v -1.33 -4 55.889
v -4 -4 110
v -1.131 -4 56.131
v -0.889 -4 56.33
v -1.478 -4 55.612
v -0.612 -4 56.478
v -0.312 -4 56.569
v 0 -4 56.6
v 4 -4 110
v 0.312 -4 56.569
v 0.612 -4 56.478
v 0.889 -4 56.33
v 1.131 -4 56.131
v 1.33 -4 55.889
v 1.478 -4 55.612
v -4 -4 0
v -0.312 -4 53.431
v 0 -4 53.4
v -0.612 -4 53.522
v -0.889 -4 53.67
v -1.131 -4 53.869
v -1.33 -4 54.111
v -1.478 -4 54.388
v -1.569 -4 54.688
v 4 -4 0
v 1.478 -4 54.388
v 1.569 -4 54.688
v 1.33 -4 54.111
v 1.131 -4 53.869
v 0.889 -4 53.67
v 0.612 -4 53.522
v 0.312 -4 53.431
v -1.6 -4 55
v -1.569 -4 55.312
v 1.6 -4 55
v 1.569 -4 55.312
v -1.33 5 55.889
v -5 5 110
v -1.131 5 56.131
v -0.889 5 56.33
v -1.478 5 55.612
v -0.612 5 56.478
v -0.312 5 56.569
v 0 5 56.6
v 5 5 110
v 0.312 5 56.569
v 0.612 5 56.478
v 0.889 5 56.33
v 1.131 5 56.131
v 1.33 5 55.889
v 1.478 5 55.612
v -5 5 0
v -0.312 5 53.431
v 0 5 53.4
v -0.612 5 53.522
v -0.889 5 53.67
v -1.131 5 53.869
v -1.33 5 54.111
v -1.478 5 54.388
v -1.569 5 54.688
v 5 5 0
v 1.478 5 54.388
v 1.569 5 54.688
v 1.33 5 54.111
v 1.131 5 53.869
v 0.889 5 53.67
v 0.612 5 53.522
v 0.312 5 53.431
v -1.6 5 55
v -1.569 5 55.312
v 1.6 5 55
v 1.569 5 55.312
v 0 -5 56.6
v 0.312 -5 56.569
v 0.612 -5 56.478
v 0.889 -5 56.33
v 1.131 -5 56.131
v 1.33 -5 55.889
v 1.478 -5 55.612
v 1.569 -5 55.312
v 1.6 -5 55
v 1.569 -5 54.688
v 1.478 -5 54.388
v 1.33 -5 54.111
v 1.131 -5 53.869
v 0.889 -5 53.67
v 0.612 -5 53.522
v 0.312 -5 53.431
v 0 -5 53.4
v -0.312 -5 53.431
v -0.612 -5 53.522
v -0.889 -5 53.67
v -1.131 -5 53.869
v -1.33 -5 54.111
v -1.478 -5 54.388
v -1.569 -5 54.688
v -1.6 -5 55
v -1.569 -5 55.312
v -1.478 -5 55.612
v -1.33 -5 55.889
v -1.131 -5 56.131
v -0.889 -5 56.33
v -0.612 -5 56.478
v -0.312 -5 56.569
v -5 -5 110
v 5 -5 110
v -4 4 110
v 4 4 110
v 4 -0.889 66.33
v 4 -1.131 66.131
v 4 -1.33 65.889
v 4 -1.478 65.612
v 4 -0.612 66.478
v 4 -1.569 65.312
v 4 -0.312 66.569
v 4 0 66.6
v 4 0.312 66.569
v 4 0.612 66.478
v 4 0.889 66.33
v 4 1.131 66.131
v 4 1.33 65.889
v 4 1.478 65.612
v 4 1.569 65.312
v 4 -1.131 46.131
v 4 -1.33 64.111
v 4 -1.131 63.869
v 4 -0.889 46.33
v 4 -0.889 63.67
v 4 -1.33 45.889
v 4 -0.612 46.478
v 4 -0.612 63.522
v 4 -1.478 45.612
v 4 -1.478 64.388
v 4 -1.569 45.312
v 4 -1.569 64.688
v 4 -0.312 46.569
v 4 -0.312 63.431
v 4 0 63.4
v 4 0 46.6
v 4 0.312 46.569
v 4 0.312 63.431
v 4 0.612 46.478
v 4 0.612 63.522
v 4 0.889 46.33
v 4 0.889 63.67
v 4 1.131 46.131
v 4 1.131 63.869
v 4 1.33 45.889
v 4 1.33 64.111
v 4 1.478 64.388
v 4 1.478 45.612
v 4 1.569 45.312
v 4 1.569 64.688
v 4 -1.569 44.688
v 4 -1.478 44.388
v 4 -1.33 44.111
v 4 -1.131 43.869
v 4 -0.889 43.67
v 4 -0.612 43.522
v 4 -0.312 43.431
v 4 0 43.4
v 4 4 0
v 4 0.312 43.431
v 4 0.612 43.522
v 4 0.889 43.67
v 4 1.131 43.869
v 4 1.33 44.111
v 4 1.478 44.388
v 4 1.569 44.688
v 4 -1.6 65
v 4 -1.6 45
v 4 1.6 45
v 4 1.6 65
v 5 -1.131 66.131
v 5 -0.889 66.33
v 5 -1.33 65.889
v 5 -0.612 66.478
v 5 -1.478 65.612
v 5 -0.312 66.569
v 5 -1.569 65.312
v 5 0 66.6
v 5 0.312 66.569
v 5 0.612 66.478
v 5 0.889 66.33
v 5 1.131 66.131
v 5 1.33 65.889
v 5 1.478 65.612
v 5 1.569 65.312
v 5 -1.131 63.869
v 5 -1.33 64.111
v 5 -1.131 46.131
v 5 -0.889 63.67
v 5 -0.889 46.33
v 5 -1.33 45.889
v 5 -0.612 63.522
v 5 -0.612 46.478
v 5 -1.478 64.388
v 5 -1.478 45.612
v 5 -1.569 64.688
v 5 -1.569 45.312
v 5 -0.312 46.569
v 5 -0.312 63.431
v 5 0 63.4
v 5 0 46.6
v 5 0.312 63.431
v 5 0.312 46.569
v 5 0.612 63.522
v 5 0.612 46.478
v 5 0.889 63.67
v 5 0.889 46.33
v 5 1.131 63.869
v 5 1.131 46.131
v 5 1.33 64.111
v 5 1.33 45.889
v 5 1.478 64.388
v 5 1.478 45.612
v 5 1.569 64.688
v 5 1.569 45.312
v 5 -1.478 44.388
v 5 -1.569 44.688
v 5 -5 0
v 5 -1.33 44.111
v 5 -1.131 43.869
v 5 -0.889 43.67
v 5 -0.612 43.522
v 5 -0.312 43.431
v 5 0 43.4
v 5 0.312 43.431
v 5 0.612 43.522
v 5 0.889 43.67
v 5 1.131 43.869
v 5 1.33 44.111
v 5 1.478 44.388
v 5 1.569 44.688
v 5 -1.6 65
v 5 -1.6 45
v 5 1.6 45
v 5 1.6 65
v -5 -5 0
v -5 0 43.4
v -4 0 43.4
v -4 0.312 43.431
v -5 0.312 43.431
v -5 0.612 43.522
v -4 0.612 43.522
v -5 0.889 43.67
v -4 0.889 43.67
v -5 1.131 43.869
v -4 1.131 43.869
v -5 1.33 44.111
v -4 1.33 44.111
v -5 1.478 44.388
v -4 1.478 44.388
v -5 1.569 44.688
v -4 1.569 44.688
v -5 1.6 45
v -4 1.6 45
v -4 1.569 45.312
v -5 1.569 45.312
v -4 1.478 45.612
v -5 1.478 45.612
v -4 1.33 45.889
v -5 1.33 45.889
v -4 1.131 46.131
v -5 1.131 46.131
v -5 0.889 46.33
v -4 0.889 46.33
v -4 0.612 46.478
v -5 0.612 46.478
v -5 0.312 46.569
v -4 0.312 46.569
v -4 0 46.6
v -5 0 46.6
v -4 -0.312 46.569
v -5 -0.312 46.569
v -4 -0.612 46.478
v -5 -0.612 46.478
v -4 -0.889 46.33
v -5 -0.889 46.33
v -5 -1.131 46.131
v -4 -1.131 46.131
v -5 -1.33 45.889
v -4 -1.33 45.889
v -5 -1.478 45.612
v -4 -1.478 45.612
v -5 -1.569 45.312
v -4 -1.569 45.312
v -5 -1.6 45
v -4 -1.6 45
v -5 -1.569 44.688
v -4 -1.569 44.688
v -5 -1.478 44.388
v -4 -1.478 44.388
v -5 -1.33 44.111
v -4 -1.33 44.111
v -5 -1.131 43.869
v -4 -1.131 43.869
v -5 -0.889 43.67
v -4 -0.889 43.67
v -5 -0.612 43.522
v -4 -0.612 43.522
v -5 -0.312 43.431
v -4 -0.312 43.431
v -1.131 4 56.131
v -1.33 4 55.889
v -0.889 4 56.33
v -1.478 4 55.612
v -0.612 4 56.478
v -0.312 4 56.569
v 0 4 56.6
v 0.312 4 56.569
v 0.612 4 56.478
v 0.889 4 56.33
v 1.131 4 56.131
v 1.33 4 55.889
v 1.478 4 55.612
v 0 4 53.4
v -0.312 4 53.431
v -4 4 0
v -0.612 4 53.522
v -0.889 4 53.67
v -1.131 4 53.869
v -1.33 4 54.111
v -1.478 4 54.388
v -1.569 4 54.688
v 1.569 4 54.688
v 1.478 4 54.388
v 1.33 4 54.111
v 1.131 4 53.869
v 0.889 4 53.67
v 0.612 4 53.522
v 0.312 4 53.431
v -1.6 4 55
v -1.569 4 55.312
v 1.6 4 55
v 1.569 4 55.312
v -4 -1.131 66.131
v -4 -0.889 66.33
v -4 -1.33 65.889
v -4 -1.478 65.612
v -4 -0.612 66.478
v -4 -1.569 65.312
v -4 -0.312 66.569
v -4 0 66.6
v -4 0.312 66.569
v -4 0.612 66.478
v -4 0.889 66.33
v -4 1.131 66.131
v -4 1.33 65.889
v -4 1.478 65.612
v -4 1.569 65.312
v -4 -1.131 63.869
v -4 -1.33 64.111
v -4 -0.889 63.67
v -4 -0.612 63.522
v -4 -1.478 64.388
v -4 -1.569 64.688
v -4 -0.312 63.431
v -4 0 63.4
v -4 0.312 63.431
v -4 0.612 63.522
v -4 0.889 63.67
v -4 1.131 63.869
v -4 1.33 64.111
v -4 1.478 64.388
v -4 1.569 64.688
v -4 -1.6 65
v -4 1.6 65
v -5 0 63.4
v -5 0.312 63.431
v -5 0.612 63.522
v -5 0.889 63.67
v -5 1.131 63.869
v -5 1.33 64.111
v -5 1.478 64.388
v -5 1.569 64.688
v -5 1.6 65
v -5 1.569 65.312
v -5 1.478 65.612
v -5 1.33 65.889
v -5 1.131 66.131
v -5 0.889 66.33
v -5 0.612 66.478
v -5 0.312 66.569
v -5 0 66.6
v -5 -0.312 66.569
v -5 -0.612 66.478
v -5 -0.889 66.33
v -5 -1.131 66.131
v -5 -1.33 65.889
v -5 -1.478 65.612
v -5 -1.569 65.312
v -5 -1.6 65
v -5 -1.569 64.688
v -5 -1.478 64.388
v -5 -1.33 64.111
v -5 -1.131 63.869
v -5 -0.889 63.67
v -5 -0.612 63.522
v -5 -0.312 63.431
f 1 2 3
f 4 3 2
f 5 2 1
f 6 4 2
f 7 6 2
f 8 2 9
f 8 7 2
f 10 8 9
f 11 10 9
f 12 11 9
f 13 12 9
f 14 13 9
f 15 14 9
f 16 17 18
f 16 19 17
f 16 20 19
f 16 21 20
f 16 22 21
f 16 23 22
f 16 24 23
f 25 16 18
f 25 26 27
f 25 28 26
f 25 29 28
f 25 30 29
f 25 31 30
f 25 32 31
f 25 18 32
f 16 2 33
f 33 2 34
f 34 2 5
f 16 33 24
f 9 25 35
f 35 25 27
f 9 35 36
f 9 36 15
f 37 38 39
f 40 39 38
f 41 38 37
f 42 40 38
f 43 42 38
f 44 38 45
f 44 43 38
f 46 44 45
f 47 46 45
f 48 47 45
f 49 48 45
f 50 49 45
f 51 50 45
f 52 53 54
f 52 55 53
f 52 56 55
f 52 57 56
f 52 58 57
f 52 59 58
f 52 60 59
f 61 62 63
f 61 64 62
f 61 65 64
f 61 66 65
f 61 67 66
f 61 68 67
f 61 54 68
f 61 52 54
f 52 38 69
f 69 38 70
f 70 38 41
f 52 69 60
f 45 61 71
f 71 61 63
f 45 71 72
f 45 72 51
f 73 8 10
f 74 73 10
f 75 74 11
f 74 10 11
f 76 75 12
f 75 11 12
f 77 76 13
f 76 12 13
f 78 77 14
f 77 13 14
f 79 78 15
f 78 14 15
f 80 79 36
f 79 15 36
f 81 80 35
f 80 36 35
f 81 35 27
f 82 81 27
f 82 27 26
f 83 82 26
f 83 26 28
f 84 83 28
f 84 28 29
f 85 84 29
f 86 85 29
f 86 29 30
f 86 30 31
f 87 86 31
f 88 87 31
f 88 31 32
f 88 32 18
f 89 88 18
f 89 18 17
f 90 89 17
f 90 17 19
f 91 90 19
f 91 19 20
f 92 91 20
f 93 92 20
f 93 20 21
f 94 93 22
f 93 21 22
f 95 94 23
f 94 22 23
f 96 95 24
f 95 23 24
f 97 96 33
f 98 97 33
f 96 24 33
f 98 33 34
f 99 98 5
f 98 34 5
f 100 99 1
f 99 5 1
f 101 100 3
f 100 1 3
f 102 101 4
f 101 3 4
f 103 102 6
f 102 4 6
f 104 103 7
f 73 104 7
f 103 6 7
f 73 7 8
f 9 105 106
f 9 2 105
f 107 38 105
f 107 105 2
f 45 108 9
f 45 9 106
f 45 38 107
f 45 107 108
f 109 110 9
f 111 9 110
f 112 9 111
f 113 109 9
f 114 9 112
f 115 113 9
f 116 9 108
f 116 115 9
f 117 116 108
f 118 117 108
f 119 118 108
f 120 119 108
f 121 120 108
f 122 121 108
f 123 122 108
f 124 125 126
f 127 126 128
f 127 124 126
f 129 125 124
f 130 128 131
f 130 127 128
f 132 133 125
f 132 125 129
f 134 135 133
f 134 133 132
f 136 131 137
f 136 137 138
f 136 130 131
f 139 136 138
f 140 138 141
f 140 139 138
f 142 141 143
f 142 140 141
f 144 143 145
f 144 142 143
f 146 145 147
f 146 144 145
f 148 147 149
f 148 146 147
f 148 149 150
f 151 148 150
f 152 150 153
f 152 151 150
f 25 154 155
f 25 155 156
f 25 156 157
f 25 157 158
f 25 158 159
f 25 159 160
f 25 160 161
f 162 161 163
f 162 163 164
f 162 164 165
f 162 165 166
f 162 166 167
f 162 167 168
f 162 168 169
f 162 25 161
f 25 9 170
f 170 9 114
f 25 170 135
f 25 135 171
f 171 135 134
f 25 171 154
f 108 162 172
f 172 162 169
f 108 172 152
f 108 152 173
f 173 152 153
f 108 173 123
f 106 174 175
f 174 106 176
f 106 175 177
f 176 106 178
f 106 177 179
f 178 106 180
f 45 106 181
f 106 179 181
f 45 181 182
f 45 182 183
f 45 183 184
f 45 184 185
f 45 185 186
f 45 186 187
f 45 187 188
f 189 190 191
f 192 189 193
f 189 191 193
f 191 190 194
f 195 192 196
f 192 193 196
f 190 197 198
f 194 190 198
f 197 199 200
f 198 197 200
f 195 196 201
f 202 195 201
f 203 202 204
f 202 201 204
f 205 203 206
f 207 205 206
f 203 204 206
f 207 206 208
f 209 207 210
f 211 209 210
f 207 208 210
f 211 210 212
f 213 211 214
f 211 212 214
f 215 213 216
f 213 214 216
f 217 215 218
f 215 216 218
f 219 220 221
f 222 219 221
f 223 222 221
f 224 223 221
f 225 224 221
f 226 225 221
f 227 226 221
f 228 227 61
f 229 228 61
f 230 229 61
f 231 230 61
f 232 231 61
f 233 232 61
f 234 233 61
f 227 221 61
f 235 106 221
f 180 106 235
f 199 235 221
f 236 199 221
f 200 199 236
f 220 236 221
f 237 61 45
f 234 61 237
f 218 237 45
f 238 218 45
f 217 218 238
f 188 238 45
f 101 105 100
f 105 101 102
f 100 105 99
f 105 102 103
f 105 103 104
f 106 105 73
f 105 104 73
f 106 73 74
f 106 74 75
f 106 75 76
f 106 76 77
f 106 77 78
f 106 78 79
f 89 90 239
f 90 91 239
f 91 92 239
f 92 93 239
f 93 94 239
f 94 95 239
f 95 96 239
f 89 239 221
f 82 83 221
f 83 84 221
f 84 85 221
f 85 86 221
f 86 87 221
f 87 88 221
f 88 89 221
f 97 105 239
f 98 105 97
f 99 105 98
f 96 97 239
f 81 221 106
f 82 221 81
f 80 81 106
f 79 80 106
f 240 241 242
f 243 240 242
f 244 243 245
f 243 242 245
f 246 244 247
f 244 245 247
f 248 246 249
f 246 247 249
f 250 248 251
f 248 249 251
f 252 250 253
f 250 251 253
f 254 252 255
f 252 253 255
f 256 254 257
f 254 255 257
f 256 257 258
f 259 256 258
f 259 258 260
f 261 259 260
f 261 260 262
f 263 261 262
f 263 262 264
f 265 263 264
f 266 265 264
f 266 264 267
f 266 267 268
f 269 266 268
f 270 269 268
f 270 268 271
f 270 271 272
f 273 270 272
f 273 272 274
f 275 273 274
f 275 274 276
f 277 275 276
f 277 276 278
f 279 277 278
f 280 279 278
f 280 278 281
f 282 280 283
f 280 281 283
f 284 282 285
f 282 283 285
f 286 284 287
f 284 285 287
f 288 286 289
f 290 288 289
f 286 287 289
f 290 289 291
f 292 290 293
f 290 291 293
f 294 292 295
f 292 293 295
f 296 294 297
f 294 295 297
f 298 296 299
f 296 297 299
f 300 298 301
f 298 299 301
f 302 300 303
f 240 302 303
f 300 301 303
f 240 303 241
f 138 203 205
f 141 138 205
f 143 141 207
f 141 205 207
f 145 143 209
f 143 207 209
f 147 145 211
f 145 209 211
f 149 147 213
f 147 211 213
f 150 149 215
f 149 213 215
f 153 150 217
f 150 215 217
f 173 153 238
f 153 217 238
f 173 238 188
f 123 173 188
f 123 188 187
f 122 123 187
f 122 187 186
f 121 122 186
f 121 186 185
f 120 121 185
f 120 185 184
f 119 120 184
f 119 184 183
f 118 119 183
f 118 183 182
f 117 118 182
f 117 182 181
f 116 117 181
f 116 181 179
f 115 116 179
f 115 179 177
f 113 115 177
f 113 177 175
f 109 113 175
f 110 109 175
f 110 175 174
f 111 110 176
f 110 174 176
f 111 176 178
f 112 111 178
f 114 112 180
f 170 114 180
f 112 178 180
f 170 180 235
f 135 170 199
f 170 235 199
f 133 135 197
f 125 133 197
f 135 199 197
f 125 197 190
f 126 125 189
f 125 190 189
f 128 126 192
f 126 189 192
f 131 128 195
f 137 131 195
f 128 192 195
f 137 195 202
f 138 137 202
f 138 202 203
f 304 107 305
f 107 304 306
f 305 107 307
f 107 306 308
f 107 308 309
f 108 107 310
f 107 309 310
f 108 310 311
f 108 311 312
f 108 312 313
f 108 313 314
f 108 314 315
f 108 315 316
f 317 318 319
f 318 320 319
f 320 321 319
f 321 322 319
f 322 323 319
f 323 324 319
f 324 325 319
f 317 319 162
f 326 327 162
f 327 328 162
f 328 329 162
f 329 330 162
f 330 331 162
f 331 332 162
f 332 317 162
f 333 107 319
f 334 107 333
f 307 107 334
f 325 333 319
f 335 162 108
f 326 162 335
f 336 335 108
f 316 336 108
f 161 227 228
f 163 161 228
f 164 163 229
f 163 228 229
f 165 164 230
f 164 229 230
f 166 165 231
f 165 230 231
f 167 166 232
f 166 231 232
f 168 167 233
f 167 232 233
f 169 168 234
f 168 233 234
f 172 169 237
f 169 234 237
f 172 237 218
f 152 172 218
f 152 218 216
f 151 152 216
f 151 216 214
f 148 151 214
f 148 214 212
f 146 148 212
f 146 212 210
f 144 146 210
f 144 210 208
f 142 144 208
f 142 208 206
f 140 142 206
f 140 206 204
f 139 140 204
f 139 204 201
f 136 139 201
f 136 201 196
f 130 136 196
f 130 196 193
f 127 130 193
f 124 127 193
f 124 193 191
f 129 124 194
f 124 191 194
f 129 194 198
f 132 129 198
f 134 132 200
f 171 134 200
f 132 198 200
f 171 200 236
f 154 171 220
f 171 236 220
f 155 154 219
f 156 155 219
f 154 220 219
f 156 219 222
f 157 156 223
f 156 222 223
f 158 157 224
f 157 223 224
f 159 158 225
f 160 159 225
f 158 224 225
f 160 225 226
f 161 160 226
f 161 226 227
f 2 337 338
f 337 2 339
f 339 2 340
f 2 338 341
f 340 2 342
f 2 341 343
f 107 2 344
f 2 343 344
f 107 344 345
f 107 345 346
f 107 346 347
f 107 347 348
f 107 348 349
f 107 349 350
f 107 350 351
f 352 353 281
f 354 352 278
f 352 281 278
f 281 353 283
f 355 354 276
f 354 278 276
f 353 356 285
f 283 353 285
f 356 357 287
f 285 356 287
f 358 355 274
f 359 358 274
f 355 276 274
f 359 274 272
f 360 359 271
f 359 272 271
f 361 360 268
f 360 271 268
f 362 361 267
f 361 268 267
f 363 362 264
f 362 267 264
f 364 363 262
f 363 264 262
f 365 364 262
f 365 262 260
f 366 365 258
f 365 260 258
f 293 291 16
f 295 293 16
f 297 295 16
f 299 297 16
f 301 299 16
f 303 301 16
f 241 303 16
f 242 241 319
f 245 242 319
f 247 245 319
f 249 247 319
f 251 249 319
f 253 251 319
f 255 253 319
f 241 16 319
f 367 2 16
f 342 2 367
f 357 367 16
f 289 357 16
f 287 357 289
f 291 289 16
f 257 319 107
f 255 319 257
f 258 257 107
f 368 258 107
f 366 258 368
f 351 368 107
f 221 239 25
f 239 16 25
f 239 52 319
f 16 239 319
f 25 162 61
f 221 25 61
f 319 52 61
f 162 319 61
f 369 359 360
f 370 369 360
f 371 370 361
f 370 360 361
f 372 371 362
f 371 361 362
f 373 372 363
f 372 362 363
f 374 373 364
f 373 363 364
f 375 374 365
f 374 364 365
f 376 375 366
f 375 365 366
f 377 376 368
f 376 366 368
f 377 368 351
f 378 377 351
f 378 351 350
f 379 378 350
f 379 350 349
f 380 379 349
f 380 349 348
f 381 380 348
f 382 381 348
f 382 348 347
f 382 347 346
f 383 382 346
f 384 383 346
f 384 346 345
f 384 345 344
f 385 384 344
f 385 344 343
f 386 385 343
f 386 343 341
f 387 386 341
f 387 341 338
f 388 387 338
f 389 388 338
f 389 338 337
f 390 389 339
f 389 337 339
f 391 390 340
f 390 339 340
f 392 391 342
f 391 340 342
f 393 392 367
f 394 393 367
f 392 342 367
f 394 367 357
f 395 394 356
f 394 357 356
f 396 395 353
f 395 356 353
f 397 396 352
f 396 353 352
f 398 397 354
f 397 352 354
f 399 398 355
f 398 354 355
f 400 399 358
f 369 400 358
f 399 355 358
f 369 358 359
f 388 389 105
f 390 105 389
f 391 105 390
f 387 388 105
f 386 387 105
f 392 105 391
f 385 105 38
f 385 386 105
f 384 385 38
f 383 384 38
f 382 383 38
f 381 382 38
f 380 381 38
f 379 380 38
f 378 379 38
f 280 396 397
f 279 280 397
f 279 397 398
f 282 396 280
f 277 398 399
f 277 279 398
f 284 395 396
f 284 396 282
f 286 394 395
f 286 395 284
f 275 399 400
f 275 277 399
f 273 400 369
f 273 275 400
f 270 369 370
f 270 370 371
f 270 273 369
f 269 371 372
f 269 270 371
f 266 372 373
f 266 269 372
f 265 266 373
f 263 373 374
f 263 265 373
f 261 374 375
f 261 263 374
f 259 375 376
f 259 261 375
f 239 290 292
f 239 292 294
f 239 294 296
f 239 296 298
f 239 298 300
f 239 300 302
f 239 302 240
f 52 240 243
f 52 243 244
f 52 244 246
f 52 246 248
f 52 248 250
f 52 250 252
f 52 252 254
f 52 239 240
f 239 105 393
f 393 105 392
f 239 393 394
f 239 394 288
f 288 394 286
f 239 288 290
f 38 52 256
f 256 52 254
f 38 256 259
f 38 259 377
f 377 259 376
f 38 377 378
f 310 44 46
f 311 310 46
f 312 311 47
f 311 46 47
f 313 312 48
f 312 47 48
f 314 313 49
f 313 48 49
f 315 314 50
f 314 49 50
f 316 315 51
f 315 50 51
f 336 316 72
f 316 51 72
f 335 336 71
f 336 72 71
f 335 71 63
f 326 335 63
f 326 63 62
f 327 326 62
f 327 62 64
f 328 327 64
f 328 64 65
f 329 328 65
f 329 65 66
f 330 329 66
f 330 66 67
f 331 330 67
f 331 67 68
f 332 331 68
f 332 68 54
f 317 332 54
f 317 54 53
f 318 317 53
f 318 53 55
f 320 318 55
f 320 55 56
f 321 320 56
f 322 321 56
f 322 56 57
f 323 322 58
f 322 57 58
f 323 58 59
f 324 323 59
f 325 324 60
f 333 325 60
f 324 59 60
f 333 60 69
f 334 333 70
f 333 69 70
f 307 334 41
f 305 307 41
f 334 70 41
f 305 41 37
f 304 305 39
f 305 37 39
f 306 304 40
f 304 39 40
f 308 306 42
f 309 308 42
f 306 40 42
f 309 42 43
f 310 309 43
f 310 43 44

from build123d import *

# Parameters (mm, degrees)
SKETCH_1_W          = 10
SKETCH_1_H          = 10
SKETCH_1_W_2        = 8
SKETCH_1_H_2        = 8
EXTRUDE_1_DEPTH     = 110
SKETCH_2_R          = 1.6
CUT_EXTRUDE_1_DEPTH = 111.566721937
SKETCH_3_R          = 1.6
CUT_EXTRUDE_2_DEPTH = 111.566721937


with BuildPart() as part:
    # ｽｹｯﾁ1 → ﾎﾞｽ - 押し出し1 (new body)
    with BuildSketch(Plane.XY):
        Rectangle(SKETCH_1_W, SKETCH_1_H)
        Rectangle(SKETCH_1_W_2, SKETCH_1_H_2, mode=Mode.SUBTRACT)
    extrude(amount=EXTRUDE_1_DEPTH)

    # ｽｹｯﾁ2 → ｶｯﾄ - 押し出し1 (cut, through all)
    with BuildSketch(Plane(origin=(0, 5, 0), x_dir=(1, 0, 0), z_dir=(0, 1, 0))):
        with Locations(Location((0, -55, 0), (0, 0, 270))):
            Circle(SKETCH_2_R)
    extrude(amount=-CUT_EXTRUDE_1_DEPTH, mode=Mode.SUBTRACT)

    # ｽｹｯﾁ3 → ｶｯﾄ - 押し出し2 (cut, through all)
    with BuildSketch(Plane(origin=(5, 0, 0), x_dir=(0, 0, -1), z_dir=(1, 0, 0))):
        with Locations((-65, 0)):
            Circle(SKETCH_3_R)
        with Locations((-45, 0)):
            Circle(SKETCH_3_R)
    extrude(amount=-CUT_EXTRUDE_2_DEPTH, mode=Mode.SUBTRACT)


solid = part.part
